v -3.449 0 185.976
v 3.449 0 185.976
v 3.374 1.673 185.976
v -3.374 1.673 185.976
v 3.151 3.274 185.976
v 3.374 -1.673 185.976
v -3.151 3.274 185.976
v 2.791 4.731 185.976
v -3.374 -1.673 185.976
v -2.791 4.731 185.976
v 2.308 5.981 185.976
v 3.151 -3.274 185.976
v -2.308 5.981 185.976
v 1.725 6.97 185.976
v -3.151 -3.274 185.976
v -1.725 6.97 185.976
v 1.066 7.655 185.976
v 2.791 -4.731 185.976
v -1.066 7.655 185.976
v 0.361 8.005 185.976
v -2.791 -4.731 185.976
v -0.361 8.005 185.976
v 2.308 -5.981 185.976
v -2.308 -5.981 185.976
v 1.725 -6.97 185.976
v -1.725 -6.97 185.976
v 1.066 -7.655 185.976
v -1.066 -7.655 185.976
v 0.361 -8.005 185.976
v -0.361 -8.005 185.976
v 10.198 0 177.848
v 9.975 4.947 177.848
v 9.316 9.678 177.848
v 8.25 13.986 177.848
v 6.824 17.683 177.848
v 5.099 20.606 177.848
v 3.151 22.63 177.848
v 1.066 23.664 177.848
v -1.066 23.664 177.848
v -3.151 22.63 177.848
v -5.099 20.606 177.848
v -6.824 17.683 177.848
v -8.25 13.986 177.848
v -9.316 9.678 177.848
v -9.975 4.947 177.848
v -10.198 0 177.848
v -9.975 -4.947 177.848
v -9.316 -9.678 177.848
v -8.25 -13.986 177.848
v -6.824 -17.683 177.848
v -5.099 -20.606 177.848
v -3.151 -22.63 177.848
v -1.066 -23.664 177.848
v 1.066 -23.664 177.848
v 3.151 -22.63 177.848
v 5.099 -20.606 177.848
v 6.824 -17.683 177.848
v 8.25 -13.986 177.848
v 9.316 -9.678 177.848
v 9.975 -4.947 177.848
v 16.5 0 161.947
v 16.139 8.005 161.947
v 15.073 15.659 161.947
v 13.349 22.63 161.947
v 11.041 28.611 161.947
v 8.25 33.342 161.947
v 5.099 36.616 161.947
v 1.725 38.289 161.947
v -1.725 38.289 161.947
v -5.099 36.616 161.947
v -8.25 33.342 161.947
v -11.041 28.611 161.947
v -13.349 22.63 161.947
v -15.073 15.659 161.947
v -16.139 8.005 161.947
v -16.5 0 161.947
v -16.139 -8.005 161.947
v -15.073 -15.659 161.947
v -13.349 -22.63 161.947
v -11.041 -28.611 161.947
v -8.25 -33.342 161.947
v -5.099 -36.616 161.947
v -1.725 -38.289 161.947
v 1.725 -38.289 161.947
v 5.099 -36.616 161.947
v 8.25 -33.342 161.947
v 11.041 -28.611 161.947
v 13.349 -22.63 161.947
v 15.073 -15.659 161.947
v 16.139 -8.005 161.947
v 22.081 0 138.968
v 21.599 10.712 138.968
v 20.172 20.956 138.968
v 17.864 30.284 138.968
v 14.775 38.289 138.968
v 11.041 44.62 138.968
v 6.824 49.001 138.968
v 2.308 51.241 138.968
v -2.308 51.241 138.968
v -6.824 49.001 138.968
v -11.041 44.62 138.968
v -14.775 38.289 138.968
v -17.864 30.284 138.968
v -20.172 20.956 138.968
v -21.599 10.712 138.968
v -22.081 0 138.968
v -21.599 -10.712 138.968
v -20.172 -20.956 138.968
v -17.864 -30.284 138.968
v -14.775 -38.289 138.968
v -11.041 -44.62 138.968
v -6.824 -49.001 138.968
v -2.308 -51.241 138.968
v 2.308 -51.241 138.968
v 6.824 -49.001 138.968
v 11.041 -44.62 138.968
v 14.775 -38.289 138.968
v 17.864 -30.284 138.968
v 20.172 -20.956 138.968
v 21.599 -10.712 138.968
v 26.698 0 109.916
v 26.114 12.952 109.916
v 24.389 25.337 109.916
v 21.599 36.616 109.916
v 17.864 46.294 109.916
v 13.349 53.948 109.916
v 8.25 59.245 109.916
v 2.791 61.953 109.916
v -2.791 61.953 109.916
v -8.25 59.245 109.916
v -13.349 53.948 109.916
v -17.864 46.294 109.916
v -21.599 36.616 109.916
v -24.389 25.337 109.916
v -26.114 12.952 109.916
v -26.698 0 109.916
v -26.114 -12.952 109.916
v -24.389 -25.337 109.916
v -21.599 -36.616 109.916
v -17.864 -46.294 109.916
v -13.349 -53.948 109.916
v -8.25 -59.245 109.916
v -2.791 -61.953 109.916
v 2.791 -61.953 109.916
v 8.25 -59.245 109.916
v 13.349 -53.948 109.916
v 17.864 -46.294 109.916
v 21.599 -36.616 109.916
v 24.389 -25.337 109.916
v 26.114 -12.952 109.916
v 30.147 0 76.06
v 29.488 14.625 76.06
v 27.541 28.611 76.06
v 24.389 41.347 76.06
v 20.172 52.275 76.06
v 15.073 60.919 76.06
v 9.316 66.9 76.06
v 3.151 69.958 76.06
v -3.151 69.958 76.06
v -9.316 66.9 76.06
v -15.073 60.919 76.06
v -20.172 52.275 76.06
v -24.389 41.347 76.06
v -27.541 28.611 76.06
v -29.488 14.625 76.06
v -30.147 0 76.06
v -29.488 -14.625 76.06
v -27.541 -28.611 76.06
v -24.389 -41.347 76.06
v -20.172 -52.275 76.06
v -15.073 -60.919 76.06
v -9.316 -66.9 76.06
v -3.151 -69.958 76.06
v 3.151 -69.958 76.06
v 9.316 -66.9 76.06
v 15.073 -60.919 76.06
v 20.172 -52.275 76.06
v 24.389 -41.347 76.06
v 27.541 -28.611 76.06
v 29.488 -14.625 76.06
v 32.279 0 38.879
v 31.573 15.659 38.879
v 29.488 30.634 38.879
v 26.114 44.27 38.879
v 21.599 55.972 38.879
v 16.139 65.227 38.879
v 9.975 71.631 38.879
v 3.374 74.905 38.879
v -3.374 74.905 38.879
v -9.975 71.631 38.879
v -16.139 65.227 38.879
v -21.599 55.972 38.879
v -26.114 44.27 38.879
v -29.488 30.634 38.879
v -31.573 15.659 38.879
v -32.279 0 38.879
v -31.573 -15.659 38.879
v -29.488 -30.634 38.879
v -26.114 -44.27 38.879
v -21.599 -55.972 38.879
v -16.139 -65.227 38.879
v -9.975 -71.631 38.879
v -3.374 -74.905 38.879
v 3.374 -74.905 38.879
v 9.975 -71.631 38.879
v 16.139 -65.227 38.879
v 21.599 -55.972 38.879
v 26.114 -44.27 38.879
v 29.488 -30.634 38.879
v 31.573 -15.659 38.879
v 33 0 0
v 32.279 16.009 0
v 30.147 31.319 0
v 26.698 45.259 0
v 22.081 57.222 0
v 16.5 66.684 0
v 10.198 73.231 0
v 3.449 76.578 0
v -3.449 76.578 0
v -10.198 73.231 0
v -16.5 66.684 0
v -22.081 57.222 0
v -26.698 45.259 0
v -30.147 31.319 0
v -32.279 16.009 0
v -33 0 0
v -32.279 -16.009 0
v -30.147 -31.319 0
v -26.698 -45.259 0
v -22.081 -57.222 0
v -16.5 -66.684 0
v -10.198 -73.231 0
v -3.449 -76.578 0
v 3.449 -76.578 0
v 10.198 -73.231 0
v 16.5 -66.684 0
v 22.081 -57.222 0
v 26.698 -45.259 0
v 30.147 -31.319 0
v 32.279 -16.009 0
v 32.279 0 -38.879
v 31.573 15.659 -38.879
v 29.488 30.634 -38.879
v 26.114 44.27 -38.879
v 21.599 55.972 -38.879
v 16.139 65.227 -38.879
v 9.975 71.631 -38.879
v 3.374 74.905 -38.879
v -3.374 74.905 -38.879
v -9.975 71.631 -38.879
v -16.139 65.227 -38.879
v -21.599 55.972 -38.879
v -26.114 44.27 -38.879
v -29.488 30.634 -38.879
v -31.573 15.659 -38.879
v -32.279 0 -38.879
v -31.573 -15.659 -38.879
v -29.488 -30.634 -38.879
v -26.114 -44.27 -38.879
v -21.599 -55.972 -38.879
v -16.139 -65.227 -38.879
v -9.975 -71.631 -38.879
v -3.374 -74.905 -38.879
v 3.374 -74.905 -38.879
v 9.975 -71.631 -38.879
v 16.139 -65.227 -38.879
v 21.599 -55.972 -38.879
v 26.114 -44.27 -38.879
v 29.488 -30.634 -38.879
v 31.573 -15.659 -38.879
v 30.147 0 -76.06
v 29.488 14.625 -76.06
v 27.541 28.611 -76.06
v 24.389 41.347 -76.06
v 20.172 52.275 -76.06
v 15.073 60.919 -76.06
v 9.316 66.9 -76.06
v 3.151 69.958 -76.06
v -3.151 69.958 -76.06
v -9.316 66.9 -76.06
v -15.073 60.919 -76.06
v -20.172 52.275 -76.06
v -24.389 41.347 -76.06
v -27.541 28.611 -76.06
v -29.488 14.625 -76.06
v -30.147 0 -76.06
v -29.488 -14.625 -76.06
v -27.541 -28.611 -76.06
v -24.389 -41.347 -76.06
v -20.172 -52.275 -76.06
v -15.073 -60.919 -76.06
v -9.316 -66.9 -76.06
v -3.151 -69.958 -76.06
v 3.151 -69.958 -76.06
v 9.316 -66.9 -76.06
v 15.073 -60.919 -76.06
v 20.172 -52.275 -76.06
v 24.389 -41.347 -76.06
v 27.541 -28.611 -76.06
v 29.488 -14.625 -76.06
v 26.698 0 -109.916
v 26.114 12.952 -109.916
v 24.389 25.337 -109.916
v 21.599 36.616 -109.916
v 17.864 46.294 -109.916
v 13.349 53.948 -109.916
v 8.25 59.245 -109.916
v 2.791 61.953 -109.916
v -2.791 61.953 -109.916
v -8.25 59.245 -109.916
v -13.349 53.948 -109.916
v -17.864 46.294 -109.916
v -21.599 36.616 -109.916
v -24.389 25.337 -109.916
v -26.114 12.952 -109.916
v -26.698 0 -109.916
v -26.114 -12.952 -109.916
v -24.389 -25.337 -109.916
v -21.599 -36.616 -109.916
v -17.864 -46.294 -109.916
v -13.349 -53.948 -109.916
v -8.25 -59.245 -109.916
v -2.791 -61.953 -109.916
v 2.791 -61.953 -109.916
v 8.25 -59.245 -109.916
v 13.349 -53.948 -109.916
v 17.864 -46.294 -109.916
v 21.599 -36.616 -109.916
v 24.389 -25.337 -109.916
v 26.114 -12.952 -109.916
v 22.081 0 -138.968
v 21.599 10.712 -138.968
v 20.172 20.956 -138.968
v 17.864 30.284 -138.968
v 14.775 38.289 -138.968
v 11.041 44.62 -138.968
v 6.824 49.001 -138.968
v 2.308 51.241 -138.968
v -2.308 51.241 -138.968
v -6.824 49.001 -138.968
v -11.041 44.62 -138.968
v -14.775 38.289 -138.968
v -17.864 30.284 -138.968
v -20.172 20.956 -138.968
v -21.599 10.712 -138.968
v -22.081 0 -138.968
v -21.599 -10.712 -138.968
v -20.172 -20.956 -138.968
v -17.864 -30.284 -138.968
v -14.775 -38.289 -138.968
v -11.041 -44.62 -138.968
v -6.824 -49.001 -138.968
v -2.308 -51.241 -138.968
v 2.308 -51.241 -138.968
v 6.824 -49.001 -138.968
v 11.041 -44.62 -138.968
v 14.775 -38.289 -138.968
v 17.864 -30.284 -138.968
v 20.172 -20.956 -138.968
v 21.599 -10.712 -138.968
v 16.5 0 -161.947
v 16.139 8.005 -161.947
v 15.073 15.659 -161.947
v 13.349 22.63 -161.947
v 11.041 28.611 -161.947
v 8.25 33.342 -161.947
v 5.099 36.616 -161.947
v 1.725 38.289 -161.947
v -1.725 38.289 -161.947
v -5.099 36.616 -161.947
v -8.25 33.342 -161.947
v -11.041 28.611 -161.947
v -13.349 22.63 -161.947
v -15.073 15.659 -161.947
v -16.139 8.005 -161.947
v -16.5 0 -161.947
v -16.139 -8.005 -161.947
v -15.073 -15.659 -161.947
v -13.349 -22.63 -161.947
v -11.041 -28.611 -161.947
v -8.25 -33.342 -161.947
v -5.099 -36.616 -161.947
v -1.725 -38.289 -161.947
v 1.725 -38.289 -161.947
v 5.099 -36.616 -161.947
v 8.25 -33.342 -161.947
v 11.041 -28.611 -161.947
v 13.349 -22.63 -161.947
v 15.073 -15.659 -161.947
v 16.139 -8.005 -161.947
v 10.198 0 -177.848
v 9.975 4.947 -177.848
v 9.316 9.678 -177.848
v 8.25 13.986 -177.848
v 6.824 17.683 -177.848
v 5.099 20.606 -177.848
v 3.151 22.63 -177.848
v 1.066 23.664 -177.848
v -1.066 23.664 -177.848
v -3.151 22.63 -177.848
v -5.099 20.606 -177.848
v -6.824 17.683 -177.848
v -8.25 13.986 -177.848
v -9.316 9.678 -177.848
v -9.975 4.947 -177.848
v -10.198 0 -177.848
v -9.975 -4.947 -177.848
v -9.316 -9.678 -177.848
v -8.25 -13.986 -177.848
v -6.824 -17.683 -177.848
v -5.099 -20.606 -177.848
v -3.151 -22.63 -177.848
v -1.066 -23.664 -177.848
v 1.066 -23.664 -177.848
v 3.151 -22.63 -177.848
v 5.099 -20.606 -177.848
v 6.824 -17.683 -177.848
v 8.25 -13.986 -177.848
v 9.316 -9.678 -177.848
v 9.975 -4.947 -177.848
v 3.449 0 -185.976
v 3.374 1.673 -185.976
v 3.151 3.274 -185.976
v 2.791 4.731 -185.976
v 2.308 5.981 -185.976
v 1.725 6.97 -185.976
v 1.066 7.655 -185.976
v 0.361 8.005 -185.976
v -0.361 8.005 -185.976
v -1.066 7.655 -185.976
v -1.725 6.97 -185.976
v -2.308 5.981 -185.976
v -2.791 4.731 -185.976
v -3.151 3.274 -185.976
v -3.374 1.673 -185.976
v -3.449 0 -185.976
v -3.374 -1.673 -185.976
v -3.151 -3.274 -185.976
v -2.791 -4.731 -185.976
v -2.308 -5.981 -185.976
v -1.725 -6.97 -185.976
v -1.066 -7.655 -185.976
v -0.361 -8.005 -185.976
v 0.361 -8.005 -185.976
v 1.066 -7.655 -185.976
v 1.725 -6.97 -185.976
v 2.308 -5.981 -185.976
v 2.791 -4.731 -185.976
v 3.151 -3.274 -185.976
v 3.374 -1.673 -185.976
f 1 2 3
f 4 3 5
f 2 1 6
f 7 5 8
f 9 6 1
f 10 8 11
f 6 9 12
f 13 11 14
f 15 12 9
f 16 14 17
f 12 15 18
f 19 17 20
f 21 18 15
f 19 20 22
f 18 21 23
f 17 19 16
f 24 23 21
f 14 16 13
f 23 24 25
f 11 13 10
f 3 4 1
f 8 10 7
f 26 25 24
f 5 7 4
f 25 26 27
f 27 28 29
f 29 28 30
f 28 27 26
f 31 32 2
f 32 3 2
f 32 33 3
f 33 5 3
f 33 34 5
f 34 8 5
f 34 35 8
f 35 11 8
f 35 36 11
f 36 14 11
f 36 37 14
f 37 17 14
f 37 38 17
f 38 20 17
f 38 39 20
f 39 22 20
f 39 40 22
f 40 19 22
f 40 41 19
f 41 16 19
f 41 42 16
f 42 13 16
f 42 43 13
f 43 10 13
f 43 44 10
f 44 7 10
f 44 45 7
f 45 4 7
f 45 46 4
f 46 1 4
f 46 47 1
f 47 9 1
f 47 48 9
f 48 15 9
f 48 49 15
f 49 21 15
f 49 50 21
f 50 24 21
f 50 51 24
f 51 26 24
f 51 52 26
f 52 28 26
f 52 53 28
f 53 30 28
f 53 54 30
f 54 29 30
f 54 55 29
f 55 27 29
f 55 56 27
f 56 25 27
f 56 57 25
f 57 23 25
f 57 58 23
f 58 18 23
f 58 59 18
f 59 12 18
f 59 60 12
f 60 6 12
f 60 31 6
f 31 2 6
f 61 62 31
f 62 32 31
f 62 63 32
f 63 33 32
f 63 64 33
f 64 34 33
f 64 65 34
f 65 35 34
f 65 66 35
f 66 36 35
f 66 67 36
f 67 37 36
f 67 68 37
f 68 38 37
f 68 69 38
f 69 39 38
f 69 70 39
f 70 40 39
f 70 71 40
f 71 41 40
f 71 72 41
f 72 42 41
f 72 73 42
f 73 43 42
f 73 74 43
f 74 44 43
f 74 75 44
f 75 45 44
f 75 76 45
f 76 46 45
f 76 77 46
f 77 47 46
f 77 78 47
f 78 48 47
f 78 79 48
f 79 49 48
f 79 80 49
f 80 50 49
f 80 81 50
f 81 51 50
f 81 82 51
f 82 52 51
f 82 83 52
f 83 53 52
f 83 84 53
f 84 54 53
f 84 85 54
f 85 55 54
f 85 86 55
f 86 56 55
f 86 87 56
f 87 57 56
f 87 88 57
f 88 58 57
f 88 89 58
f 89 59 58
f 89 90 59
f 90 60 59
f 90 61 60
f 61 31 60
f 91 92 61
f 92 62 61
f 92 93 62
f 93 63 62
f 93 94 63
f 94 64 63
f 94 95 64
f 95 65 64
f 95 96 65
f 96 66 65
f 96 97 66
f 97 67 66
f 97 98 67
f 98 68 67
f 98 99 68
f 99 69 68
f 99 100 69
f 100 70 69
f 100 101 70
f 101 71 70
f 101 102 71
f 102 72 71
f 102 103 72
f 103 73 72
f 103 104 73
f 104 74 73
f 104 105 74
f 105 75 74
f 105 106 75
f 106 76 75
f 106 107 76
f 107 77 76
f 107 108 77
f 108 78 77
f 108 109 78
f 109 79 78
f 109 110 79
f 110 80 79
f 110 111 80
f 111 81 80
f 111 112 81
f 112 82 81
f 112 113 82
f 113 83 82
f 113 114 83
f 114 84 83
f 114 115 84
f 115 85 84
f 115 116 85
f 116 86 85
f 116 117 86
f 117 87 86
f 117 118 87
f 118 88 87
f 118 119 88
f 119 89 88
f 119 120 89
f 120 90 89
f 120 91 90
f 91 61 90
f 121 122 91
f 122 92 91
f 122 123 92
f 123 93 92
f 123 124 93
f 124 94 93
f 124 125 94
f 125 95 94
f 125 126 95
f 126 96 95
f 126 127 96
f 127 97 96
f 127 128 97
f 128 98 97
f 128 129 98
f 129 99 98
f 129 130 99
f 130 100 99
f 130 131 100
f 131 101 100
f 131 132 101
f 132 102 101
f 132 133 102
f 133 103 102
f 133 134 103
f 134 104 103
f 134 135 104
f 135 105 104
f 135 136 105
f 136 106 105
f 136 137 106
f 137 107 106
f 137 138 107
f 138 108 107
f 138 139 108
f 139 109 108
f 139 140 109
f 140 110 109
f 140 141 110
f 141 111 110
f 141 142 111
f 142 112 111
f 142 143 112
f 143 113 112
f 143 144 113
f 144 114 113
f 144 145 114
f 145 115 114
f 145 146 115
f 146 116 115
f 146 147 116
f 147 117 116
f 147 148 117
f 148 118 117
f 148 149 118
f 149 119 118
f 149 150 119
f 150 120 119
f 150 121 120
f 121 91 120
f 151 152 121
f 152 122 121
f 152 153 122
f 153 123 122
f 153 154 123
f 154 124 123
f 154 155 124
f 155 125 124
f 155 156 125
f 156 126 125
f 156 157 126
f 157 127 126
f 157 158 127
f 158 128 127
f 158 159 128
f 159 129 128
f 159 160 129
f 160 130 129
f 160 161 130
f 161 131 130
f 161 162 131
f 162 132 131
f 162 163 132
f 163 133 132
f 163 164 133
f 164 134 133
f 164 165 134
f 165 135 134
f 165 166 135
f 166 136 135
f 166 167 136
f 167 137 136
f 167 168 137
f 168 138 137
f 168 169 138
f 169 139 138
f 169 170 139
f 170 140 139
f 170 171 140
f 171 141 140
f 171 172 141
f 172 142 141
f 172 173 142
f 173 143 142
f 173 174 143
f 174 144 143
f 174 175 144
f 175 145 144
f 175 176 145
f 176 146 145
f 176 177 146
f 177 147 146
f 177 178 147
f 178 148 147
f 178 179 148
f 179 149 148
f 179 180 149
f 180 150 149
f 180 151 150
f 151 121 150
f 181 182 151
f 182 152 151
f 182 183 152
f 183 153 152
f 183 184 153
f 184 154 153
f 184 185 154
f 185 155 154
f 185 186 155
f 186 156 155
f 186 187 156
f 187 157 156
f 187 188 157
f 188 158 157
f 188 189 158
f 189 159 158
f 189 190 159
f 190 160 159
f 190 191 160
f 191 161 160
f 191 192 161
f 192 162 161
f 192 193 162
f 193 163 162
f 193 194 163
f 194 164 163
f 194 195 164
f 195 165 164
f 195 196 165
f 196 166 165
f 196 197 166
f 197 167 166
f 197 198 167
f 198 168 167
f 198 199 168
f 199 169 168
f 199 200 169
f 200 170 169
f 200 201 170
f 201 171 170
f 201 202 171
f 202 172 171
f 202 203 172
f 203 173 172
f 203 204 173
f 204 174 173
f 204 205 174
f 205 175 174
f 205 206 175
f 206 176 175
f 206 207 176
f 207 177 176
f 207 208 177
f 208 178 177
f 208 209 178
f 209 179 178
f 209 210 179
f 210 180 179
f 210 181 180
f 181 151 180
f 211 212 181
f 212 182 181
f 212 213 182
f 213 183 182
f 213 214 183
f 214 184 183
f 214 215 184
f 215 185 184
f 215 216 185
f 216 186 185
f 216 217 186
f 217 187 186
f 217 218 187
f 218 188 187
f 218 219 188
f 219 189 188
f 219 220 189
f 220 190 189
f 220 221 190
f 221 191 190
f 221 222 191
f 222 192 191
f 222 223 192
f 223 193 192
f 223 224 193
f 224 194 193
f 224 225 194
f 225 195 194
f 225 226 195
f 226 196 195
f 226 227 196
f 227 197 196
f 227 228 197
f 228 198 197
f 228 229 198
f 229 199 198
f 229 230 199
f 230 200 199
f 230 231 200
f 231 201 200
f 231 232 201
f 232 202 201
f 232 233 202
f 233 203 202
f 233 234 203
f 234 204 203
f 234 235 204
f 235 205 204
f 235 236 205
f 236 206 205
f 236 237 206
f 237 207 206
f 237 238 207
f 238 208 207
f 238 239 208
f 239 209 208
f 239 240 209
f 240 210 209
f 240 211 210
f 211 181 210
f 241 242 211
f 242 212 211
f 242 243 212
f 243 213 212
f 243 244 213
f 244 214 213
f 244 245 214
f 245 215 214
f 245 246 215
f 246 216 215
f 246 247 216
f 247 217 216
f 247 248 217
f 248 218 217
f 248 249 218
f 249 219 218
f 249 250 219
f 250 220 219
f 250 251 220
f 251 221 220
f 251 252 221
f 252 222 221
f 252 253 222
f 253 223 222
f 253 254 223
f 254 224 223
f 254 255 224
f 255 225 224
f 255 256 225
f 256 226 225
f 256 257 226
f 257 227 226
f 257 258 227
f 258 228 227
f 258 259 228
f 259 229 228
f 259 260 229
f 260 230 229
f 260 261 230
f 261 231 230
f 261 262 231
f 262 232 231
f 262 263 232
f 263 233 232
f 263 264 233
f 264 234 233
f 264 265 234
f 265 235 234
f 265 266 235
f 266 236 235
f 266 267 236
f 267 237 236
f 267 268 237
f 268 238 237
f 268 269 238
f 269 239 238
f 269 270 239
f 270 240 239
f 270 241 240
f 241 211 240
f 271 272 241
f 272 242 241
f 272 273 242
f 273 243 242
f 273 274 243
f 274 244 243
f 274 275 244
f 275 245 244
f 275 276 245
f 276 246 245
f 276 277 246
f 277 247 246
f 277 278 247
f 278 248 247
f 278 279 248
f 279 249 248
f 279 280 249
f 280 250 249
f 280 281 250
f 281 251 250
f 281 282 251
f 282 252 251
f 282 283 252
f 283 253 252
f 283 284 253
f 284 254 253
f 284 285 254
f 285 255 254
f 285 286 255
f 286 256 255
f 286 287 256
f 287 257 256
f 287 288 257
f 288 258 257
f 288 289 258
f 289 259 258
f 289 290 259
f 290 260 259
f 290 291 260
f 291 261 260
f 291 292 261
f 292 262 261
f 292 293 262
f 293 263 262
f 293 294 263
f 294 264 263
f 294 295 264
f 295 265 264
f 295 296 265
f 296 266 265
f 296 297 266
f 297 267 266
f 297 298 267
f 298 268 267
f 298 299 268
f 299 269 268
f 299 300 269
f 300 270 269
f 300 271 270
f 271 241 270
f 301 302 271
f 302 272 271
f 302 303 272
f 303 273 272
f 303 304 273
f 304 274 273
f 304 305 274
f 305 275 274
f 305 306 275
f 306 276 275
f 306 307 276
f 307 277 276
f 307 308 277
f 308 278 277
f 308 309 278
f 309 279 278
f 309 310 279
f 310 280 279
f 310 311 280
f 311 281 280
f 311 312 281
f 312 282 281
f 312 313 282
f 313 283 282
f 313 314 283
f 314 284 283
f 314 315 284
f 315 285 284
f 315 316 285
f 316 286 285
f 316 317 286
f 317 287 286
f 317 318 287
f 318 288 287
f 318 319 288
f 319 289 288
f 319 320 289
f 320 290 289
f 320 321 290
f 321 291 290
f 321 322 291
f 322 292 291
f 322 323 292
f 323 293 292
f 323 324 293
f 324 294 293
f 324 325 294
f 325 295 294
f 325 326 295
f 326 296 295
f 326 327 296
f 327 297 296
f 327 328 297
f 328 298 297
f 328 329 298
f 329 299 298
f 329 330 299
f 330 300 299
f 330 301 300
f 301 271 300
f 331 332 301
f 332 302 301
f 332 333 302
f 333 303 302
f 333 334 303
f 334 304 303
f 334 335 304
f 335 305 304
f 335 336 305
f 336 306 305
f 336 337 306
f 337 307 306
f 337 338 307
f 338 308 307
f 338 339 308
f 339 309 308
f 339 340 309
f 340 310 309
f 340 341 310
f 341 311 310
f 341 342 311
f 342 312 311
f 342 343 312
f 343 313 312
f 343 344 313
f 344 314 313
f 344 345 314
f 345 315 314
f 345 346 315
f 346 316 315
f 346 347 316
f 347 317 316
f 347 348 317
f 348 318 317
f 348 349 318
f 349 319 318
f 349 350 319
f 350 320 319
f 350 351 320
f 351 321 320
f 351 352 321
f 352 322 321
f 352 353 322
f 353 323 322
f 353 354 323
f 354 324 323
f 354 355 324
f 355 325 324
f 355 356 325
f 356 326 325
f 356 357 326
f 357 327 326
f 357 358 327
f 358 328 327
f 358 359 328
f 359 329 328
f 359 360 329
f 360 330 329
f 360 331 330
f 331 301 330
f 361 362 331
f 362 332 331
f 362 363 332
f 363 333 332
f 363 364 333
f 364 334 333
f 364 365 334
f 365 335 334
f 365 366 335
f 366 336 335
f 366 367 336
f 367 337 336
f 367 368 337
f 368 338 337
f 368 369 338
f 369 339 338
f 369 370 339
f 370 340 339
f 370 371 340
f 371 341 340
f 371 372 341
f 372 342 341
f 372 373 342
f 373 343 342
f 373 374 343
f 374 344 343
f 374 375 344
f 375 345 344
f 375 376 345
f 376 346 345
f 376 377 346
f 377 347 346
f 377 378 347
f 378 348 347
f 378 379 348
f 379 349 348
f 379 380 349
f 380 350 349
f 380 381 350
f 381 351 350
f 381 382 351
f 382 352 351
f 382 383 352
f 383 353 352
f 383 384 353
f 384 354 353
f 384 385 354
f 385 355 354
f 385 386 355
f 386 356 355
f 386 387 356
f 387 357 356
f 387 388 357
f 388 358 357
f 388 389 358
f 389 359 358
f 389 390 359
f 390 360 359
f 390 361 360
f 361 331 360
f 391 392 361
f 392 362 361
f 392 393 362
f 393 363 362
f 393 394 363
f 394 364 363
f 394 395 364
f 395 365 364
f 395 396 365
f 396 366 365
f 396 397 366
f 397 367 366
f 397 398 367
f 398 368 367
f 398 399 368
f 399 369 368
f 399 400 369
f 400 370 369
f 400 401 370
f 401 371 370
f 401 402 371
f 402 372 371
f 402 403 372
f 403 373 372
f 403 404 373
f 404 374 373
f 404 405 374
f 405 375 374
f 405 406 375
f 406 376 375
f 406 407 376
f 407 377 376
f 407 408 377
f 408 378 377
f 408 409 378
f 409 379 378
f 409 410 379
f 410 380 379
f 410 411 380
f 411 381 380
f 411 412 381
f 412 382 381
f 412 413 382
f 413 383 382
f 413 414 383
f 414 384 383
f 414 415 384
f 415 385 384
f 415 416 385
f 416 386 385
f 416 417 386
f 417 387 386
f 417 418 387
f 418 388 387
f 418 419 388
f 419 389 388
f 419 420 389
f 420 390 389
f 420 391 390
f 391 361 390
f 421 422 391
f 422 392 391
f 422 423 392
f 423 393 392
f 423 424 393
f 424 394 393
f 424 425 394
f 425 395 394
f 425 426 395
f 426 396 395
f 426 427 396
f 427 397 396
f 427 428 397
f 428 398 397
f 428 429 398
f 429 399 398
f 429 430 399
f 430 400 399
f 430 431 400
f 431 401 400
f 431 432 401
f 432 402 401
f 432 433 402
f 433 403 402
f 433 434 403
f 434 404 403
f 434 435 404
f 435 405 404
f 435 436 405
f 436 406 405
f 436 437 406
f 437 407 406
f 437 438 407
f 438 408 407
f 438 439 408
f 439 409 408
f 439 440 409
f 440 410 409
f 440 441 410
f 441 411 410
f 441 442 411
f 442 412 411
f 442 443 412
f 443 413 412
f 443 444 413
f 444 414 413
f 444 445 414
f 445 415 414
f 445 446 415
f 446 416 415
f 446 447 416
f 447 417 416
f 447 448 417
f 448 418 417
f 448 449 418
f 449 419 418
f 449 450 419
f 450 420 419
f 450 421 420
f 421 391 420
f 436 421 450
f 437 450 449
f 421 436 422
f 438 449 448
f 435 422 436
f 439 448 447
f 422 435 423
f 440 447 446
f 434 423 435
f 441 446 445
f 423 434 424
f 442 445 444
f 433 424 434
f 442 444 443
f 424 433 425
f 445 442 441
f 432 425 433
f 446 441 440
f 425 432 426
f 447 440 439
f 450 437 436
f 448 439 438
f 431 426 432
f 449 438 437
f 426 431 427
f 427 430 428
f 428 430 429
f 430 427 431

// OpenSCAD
// Generated by SolidPython 1.0.1 on 2020-07-29 00:46:45


scale(v = [3, 7, 17]) {
	sphere(r = 11);
}
/***********************************************
*********      SolidPython code:      **********
************************************************
 
# import packages: SolidPython
from solid import *
from solid.utils import *
from itertools import chain, combinations, permutations


class Resize:

    def __init__(self, scad_file):
        self.scad_file = scad_file
        #self.scad_file = import_scad(scad_file)
        # cone/cylinder param:
        self.r1 = 0
        self.r2 = 0
        self.h = 0
        # rectangular prism param:
        self.w = 0
        self.l = 0
        # ellipse param:
        self.r = 0

    # import OpenScad code (file name corresponds to shape)


    # classify shape + parameters
    def assign(self, param1, param2, param3):
        if self.scad_file == 'cone.scad':
            self.r1 = param1
            self.r2 = param2
            self.h = param3
        elif self.scad_file == 'cylinder.scad':
            self.r1 = param1
            self.r2 = param2
            self.h = param3
        elif self.scad_file == 'rectangularPrism.scad':
            self.h = param1
            self.l = param2
            self.w = param3
        else:
            self.r = param1
            self.h = param2

    # resize parameters
    def iterate(self):
        x = range(3, 20, 2)
        i = 1
        if self.scad_file == 'cone.scad':
            tempList = list(permutations(x, 2))
            for temp in tempList:
                param1 = temp[0]
                param2 = temp[1]
                filepath = 'produced_scad_files/' + 'cone' + str(param1) + '_' + str(param2) + '_' + '.scad'
                scad_render_to_file(cylinder(h=param1, r1=param2, r2=0), filepath)

        elif self.scad_file == 'cylinder.scad':
            tempList = list(permutations(x, 3))
            for temp in tempList:
                param1 = temp[0]
                param2 = temp[1]
                filepath = 'produced_scad_files/' + 'cylinder' + str(param1) + '_' + str(param2) + '_' + '.scad'
                scad_render_to_file(cylinder(h=param1, r1=param2, r2=param2), filepath)

        elif self.scad_file == 'rectangularPrism.scad':
            tempList = list(permutations(x, 3))
            for temp in tempList:
                param1 = temp[0]
                param2 = temp[1]
                param3 = temp[2]
                filepath = 'produced_scad_files/' + 'rectangularPrism' + str(param1) + '_' + str(param2) + '_' + str(
                    param3) + '.scad'
                scad_render_to_file(cube(size=(param1, param2, param3)), filepath)

        elif self.scad_file == 'ellipse.scad':
            tempList = list(permutations(x, 4))
            for temp in tempList:
                param1 = temp[0]
                param2 = temp[1]
                param3 = temp[2]
                param4 = temp[3]
                filepath = 'produced_scad_files/' + 'ellipse' + str(param1) + '_' + str(param2) + '_' + str(param3) + '_' + str(param4) + '.scad'
                scad_render_to_file(scale([param1, param2, param3])(sphere(r=param4)), filepath)

    def render_to_scadfile(self):
        scad_render_to_file(scad, 'example.scad') 
 
************************************************/
